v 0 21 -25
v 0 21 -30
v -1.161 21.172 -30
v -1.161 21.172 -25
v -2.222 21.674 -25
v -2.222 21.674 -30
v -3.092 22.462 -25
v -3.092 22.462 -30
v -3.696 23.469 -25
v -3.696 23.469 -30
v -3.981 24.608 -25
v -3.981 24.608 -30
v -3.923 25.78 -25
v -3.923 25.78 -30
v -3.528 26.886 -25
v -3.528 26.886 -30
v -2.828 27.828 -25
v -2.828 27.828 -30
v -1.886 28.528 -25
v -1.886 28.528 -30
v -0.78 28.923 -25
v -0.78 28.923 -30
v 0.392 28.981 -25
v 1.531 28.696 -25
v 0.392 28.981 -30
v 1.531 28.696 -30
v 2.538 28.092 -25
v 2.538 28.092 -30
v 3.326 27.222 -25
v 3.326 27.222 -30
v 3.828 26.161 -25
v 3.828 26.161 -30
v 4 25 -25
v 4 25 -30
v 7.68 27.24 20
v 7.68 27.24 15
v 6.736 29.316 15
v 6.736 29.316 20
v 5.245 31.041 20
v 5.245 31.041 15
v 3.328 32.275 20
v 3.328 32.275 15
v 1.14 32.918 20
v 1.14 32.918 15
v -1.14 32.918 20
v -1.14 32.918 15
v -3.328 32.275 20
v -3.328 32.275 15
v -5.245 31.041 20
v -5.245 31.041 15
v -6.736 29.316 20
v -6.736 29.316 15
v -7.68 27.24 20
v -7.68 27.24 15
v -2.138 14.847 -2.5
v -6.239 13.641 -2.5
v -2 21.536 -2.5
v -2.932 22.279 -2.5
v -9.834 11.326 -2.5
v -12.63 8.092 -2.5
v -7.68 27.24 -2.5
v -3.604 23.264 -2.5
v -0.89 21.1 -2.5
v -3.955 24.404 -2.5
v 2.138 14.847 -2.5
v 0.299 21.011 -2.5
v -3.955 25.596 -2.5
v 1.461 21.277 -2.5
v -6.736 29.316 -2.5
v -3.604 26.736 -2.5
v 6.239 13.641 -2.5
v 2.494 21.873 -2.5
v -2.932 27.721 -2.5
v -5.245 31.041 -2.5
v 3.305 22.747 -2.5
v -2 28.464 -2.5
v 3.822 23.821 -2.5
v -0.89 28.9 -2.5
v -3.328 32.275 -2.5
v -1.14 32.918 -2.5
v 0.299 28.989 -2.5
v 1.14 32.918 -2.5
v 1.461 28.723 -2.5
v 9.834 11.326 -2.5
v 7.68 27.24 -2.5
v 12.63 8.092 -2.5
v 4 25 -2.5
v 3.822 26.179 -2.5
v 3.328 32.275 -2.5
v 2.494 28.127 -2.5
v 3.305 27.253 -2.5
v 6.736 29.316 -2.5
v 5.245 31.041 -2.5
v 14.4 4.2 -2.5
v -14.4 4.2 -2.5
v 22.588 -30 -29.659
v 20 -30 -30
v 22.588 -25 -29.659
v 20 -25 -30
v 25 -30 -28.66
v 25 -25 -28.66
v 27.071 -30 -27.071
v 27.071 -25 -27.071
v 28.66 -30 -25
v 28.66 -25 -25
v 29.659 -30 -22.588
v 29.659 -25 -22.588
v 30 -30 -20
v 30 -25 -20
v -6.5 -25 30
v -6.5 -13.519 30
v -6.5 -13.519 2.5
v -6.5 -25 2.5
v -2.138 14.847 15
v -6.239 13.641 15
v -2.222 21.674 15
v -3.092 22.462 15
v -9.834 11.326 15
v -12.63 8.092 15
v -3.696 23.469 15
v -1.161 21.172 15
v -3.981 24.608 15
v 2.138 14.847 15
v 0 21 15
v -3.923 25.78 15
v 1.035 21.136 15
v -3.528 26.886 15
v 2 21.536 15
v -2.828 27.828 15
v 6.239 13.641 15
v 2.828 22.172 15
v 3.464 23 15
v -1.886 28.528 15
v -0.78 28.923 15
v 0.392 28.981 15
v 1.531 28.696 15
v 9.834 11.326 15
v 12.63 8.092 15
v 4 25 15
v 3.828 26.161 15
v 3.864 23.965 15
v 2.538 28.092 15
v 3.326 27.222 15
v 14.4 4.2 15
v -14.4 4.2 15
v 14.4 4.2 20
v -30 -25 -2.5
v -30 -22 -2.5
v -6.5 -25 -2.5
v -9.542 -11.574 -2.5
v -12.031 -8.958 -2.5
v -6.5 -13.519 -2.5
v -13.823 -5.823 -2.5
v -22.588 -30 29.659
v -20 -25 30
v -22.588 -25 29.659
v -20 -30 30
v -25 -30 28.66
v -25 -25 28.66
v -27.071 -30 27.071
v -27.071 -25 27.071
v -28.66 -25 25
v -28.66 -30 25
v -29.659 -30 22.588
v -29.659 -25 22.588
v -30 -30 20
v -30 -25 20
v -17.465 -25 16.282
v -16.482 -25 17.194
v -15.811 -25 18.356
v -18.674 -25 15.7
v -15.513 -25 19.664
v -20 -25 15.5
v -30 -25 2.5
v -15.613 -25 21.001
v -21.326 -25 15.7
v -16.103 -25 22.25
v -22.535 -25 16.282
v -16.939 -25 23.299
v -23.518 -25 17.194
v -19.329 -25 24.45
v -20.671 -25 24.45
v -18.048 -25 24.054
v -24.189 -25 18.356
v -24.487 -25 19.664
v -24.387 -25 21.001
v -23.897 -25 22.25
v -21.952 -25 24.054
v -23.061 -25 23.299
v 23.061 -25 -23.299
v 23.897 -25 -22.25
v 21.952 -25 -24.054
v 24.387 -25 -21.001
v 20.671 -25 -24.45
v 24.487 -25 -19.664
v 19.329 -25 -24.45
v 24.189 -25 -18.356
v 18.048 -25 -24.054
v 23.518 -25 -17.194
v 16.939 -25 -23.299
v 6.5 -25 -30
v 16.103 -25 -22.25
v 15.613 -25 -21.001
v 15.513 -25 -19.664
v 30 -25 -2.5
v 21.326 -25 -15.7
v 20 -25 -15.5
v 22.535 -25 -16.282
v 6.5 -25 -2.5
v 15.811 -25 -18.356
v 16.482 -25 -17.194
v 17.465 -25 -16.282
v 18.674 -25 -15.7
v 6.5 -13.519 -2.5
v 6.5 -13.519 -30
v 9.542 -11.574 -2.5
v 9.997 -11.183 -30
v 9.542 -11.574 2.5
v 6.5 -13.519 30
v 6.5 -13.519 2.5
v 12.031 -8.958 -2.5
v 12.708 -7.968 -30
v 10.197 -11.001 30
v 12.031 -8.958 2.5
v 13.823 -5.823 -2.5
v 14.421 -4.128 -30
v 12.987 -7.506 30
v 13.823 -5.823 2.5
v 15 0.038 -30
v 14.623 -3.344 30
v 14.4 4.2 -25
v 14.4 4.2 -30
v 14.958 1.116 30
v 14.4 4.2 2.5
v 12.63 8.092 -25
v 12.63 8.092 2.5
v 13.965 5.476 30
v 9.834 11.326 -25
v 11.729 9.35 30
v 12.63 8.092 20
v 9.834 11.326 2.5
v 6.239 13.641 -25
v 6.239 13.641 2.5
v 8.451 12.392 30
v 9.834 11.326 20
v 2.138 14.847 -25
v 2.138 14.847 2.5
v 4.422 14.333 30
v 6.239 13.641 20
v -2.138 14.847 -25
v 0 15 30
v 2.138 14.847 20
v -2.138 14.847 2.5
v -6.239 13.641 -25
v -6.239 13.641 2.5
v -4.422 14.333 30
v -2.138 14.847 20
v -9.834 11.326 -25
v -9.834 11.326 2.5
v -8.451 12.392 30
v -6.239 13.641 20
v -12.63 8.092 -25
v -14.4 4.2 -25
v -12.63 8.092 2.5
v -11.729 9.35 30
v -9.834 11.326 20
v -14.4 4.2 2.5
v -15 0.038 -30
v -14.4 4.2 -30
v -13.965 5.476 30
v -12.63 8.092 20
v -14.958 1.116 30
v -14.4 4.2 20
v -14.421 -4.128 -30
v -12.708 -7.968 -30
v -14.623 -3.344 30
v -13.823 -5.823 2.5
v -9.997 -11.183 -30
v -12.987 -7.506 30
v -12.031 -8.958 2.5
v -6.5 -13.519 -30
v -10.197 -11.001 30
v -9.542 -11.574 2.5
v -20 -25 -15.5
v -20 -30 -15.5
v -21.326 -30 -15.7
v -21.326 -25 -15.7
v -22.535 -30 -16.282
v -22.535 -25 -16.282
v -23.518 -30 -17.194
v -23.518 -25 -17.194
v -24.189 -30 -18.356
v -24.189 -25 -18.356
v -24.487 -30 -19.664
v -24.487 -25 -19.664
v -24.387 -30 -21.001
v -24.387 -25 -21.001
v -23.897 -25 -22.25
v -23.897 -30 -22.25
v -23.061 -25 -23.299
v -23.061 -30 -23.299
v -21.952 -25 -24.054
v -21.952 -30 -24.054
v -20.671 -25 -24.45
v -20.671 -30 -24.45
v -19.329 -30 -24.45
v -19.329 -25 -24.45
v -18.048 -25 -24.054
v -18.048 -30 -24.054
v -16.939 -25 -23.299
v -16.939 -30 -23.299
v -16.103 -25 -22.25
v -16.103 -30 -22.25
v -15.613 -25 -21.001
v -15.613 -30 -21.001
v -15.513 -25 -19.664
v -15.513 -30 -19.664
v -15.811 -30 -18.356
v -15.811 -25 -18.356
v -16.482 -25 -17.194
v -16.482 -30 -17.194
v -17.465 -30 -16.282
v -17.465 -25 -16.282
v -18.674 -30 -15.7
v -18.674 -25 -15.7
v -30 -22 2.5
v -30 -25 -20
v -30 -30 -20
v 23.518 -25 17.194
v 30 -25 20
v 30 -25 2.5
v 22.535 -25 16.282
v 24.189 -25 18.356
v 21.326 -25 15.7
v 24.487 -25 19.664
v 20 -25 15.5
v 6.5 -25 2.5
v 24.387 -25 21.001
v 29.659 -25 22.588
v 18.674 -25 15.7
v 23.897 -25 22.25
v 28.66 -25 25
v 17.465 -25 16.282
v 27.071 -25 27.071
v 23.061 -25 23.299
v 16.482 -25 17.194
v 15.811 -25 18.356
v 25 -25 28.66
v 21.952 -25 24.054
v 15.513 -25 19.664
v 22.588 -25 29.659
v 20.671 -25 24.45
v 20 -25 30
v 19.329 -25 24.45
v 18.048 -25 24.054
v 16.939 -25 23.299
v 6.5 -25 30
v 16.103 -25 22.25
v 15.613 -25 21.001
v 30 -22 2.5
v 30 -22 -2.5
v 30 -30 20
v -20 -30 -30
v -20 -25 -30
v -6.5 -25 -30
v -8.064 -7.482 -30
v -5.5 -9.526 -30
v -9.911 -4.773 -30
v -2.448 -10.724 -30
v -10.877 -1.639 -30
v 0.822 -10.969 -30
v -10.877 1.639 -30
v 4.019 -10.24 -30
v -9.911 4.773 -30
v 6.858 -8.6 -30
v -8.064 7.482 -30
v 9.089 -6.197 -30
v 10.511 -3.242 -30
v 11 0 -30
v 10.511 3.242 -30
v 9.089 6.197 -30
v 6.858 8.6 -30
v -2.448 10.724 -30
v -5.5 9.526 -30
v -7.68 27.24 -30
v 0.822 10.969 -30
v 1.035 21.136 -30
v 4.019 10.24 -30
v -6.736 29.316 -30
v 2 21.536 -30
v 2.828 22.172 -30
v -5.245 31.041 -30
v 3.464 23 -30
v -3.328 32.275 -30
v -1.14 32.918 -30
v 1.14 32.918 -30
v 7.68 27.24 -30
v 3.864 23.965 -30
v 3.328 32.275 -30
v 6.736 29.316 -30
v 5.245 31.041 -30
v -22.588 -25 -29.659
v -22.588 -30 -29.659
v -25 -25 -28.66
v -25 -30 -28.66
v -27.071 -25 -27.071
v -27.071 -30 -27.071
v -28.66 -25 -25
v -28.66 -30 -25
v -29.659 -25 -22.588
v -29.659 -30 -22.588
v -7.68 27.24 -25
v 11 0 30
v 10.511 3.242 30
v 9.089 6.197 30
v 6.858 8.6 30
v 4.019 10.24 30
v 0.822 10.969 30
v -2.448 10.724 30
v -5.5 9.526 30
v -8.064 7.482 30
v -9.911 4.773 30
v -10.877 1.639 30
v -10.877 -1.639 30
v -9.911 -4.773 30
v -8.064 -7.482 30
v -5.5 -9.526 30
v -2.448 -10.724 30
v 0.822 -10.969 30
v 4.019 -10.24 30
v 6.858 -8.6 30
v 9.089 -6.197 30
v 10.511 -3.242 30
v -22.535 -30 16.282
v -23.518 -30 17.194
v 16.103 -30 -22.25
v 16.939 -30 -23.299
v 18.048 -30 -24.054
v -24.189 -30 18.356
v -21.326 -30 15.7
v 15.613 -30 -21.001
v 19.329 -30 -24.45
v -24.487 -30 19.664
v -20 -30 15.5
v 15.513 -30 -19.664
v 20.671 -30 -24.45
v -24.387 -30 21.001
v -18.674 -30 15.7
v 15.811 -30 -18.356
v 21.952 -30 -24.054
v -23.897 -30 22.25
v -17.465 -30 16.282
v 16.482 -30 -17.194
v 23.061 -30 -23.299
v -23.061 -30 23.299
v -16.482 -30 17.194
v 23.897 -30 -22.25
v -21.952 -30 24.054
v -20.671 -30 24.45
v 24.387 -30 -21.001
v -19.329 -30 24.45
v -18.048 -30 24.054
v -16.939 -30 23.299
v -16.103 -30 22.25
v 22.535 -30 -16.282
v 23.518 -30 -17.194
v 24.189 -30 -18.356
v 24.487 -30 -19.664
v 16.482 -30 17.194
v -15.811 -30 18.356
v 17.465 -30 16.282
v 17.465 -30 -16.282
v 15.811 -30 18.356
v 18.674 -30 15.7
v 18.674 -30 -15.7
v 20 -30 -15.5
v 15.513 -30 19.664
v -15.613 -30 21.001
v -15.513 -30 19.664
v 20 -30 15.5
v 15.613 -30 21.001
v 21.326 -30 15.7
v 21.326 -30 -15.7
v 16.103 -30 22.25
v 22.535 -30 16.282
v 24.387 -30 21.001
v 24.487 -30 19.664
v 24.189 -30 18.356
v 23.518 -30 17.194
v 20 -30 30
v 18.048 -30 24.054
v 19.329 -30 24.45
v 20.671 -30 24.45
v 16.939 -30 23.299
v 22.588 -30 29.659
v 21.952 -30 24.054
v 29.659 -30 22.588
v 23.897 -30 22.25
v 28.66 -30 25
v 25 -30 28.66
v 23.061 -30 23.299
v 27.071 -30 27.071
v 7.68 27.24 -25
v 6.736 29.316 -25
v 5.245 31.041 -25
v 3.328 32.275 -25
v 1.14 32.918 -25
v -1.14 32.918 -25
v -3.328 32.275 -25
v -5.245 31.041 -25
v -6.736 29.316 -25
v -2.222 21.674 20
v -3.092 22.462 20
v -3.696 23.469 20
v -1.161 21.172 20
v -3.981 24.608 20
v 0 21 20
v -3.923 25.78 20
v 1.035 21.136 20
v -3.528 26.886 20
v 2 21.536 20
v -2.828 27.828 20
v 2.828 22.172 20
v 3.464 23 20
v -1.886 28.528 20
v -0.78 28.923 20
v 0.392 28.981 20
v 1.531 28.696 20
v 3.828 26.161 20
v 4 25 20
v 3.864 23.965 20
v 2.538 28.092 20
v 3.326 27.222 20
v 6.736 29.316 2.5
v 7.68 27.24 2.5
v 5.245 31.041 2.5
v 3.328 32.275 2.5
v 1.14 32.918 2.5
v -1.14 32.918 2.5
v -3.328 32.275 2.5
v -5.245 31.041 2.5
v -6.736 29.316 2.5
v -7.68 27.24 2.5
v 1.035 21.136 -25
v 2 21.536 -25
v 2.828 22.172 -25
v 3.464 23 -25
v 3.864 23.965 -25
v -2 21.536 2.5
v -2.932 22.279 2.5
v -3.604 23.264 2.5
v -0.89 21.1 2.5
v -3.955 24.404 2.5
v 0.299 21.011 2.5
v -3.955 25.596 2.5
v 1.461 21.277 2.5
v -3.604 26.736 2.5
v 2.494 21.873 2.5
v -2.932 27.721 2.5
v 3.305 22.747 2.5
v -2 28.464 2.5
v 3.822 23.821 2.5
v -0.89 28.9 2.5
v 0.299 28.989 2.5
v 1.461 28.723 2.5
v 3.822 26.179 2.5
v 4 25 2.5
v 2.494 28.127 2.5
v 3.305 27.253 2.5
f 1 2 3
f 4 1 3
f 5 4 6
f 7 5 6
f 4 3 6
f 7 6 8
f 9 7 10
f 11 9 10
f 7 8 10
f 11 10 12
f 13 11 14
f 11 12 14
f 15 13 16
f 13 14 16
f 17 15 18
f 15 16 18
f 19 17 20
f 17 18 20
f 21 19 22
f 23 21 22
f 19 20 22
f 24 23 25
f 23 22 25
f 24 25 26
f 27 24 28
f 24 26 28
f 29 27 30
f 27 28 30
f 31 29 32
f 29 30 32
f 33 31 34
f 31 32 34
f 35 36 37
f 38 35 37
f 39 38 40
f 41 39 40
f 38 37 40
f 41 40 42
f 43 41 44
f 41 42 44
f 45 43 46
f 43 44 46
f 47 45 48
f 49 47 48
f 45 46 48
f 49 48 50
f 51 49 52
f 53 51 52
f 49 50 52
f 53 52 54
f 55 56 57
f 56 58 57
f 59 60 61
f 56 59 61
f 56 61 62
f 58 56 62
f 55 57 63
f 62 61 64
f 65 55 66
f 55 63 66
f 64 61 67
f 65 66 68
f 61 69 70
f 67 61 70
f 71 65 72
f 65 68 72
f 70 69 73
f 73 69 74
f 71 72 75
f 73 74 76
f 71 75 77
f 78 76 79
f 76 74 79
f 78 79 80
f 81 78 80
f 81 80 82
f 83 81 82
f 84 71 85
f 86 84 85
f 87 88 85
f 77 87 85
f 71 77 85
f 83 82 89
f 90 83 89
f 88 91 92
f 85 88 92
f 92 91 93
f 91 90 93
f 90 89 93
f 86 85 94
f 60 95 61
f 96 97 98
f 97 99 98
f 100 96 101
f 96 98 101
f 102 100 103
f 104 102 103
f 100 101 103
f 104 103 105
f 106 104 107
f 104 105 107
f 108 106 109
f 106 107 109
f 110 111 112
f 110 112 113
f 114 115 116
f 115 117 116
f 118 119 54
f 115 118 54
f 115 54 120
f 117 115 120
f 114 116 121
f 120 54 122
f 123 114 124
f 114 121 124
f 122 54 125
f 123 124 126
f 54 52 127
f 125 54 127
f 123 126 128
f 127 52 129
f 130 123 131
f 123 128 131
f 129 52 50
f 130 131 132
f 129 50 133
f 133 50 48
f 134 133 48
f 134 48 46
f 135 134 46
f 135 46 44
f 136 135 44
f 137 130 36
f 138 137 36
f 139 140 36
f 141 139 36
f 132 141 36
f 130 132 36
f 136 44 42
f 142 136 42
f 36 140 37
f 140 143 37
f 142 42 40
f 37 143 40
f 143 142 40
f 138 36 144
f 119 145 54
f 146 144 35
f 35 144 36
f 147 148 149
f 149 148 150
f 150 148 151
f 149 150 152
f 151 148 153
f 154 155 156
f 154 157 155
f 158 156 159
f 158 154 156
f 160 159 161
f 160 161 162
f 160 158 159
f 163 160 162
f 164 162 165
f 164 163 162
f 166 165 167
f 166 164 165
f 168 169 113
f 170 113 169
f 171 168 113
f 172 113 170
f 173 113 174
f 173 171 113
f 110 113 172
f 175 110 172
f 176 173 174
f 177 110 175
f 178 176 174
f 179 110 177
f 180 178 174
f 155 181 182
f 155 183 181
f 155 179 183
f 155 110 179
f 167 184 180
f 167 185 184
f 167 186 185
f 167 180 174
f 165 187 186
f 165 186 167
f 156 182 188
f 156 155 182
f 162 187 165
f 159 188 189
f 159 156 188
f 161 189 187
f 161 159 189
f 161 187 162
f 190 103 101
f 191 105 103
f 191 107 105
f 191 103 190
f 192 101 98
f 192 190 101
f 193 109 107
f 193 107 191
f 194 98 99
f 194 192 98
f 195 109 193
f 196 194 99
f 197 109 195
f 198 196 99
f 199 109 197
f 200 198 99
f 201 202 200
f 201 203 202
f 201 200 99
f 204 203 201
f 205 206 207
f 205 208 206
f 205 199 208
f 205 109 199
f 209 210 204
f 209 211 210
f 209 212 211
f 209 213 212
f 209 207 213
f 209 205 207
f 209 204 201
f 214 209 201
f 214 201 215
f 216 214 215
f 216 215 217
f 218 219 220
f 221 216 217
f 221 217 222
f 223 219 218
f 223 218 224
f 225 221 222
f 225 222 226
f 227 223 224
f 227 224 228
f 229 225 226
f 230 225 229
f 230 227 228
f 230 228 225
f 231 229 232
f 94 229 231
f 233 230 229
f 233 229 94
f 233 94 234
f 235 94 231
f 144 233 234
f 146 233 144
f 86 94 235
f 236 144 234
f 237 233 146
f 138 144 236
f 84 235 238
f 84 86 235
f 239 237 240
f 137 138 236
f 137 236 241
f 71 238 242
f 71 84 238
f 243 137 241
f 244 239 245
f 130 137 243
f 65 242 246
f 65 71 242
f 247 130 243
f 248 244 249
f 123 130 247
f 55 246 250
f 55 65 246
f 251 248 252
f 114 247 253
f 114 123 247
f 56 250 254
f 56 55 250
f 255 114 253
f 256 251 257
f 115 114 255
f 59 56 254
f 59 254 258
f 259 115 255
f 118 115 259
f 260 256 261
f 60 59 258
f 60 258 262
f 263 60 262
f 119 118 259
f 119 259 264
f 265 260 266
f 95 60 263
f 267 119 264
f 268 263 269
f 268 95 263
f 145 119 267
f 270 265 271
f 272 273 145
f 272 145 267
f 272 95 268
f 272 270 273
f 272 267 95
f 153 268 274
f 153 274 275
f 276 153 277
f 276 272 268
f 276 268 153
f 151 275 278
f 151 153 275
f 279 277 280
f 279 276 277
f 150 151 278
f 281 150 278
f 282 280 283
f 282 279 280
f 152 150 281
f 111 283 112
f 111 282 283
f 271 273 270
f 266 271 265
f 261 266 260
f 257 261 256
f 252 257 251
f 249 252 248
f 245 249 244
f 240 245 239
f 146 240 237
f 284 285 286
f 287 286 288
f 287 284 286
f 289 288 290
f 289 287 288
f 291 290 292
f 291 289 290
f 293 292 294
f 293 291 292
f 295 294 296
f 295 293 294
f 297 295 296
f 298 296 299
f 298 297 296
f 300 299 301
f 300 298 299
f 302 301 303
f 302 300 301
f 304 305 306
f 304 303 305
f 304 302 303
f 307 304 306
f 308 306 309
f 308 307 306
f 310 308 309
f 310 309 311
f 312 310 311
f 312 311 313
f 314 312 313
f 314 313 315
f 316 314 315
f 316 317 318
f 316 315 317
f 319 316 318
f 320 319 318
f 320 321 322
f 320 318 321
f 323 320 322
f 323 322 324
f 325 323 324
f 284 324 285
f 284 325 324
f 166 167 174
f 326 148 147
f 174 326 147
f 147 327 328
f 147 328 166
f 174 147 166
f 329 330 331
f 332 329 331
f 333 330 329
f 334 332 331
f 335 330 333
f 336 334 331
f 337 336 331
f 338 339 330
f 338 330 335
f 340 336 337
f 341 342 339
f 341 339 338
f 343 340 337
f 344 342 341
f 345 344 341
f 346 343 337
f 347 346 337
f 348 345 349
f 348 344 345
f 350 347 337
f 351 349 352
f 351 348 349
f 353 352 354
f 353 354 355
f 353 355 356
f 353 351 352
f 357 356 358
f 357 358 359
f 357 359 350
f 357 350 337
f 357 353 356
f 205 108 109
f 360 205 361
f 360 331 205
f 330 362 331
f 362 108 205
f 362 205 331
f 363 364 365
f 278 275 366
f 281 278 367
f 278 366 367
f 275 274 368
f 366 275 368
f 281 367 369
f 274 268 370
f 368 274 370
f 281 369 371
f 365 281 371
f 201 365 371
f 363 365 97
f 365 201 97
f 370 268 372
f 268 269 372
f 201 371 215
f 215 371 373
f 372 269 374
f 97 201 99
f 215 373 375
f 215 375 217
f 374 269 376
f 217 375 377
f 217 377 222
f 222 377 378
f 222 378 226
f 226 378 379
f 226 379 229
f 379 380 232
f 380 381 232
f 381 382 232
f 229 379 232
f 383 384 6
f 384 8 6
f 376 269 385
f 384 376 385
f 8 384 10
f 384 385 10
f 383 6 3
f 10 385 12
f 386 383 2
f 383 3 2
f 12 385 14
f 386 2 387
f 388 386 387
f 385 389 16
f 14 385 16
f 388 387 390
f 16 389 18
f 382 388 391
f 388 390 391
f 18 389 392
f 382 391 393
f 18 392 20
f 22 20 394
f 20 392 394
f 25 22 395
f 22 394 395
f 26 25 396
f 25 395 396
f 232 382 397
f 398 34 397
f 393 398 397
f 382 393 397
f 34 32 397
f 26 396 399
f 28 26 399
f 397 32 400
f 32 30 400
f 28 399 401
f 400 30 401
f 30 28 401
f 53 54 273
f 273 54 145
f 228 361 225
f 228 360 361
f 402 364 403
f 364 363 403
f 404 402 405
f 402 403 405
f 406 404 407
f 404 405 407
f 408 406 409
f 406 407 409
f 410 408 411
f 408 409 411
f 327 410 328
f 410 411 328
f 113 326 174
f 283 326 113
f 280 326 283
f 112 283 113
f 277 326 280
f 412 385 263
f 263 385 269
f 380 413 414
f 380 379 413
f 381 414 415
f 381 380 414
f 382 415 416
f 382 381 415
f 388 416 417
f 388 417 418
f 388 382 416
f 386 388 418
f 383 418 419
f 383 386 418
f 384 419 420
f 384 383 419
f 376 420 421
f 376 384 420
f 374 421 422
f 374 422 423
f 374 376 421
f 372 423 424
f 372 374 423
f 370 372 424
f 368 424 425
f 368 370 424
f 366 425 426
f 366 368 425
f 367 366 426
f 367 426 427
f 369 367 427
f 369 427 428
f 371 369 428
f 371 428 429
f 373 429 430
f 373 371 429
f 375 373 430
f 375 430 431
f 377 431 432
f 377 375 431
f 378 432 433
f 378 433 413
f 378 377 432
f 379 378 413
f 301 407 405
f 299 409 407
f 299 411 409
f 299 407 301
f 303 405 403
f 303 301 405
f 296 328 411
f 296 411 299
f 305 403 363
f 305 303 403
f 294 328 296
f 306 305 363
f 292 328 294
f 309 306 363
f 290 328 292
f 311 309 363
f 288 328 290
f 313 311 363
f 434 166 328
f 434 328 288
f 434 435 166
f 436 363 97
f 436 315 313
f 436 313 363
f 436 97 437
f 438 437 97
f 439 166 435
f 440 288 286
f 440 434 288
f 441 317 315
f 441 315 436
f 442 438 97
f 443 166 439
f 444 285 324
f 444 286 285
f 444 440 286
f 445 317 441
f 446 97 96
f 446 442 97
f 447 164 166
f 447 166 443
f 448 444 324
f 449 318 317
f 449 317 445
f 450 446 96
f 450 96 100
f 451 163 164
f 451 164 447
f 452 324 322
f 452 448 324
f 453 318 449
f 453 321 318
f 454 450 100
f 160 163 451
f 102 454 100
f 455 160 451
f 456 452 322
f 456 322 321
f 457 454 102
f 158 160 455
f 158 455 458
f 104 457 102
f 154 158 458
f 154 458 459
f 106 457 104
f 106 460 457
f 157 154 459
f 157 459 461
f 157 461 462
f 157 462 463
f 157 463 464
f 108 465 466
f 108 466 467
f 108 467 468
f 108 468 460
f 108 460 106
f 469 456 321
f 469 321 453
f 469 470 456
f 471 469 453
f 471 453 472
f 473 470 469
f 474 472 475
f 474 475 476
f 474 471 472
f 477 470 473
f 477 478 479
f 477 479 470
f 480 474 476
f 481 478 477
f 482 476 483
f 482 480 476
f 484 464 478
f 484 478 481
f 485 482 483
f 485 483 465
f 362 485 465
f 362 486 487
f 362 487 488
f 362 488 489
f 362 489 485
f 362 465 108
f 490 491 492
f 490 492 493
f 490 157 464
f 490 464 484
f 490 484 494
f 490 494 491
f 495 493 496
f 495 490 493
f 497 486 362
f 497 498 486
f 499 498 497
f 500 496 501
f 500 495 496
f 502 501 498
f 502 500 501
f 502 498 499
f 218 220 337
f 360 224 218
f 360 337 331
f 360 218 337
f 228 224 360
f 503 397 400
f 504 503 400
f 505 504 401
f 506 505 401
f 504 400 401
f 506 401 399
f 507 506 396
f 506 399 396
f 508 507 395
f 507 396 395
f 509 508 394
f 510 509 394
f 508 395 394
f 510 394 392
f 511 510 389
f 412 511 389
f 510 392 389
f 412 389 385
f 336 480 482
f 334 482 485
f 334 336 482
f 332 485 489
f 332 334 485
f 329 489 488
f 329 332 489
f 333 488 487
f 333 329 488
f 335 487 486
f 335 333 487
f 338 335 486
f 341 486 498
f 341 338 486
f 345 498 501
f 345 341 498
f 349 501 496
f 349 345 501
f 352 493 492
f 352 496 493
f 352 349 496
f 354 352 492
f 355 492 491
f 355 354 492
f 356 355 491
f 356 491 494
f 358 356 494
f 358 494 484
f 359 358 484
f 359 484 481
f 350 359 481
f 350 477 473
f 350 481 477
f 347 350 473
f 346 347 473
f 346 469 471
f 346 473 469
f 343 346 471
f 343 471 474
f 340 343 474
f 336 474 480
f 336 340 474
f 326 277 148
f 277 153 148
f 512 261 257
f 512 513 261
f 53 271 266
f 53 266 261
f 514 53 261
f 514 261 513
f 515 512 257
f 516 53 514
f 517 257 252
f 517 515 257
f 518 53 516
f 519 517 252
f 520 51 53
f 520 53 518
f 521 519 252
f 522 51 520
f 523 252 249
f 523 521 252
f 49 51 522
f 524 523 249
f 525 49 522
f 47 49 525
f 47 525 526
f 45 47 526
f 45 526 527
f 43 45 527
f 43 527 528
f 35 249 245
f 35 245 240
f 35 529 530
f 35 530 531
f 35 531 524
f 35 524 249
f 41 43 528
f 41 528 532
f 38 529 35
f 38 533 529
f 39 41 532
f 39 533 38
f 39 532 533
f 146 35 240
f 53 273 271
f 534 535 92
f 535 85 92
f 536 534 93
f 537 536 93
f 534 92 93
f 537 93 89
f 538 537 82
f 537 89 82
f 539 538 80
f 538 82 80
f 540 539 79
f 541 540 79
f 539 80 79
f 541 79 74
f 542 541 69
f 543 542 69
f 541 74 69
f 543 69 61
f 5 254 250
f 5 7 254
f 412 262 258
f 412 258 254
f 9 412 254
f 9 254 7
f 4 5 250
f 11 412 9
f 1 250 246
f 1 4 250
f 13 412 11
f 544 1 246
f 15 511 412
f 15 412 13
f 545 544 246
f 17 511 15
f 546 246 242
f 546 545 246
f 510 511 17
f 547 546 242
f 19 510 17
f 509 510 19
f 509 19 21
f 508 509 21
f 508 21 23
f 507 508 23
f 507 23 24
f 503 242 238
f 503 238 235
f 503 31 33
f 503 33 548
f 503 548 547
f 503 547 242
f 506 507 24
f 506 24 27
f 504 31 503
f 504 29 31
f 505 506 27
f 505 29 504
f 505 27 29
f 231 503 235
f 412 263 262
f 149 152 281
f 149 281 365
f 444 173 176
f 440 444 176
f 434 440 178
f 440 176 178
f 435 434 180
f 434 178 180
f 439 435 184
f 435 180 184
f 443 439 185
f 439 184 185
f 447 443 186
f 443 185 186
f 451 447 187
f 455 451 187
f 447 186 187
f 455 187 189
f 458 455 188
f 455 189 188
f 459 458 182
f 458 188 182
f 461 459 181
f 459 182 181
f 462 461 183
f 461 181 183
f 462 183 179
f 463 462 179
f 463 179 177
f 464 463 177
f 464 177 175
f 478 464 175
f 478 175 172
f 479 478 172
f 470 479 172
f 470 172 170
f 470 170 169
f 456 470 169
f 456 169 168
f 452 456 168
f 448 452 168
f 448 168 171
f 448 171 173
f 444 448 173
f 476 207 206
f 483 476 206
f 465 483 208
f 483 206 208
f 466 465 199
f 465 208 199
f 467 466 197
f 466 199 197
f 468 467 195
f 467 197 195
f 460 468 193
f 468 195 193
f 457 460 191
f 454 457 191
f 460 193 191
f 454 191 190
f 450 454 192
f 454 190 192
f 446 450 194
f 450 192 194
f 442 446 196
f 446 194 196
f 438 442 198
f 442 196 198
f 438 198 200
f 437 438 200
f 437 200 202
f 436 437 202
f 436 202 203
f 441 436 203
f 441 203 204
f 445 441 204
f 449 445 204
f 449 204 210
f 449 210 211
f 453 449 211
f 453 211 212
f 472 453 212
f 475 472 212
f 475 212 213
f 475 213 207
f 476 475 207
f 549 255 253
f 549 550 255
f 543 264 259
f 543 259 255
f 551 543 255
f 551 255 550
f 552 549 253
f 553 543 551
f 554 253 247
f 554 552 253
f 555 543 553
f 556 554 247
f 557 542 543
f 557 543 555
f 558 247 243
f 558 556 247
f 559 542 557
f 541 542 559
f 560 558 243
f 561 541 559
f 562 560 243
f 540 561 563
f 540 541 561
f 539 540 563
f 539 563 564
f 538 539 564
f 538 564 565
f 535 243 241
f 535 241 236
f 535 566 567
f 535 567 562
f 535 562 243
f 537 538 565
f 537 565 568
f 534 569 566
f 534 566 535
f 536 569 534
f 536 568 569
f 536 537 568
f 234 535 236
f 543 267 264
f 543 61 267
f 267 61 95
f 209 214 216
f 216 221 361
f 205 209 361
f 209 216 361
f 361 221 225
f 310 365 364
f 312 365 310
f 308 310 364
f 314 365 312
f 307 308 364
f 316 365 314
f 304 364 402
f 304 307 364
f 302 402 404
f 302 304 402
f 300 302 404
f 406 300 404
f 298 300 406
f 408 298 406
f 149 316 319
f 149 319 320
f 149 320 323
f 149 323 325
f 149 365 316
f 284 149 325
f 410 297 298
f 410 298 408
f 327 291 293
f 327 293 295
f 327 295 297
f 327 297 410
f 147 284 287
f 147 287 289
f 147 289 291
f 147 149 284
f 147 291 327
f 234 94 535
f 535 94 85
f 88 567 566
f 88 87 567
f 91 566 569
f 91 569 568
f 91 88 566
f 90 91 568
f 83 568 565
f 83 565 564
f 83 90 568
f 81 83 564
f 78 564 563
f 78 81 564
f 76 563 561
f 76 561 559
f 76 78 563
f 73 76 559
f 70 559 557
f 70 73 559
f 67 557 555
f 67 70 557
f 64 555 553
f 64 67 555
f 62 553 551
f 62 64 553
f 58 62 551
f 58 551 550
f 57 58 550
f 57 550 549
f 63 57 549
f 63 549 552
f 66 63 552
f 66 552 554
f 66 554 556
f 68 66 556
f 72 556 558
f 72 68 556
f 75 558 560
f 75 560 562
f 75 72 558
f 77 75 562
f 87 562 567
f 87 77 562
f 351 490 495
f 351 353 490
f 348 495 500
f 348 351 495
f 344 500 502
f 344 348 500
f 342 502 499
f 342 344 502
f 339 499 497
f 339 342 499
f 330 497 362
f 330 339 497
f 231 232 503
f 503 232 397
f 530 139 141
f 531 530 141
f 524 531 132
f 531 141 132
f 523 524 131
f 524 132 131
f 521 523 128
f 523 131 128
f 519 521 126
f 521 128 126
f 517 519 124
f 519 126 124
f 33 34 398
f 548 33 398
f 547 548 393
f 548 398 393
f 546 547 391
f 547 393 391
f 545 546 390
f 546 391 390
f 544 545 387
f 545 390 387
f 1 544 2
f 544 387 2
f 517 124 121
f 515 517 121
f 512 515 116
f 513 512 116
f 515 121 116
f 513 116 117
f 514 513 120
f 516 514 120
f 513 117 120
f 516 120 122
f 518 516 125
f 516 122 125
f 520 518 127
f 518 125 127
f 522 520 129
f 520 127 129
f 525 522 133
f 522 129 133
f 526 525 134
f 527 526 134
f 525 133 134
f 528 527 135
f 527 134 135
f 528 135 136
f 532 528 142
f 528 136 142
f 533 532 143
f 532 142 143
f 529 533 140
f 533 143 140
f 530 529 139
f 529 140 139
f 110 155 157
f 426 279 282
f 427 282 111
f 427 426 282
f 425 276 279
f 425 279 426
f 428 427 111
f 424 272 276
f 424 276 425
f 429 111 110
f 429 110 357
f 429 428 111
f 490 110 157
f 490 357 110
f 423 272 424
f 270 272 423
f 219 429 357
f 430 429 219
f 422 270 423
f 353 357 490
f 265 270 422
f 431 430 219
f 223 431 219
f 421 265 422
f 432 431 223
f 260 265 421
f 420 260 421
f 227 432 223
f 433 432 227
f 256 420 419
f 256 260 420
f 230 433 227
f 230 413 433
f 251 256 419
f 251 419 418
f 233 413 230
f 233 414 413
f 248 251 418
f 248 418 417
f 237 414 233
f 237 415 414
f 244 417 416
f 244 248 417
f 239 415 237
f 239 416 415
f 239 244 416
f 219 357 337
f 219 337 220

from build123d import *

# Parameters (mm, degrees)
SKETCH_2_R               = 11
EXTRUDE_2_DEPTH          = 30
SKETCH_2_6_R             = 4
EXTRUDE_3_DEPTH          = 2.5
EXTRUDE_START            = 15
EXTRUDE_4_DEPTH          = 5
EXTRUDE_START_2          = -30
EXTRUDE_5_DEPTH          = 5
SKETCH_4_R               = 4.5
CUT_EXTRUDE_1_DEPTH      = 72.860976893
MIRROR_2_COPY_1_SKETCH_R = 4.5
MIRROR_2_COPY_1_DEPTH    = 72.860976893
FILLET_1_R               = 10


with BuildPart() as part:
    # Эскиз2 → Бобышка-Вытянуть2 (new, symmetric)
    with BuildSketch(Plane.XY):
        with BuildLine():
            Line((-6.5, -13.518505835), (-6.5, -25))
            Line((-6.5, -25), (-30, -25))
            Line((-30, -25), (-30, -30))
            Line((-30, -30), (30, -30))
            Line((30, -30), (30, -25))
            Line((30, -25), (6.5, -25))
            Line((6.5, -25), (6.5, -13.518505835))
            ThreePointArc((6.5, -13.518505835), (0, 15), (-6.5, -13.518505835))
        make_face()
        Circle(SKETCH_2_R, mode=Mode.SUBTRACT)
    extrude(amount=EXTRUDE_2_DEPTH, both=True)

    # Эскиз2<6> → Бобышка-Вытянуть3 (add, symmetric)
    with BuildSketch(Plane.XY):
        with BuildLine():
            ThreePointArc((-14.4, 4.2), (-9, 12), (0, 15))
            ThreePointArc((0, 15), (9, 12), (14.4, 4.2))
            Line((14.4, 4.2), (7.68, 27.24))
            ThreePointArc((7.68, 27.24), (0, 33), (-7.68, 27.24))
            Line((-7.68, 27.24), (-14.4, 4.2))
        make_face()
        with Locations((0, 25)):
            Circle(SKETCH_2_6_R, mode=Mode.SUBTRACT)
        with BuildLine():
            ThreePointArc((-6.5, -13.518505835), (-10.865729218, -10.340982959), (-13.823441352, -5.823441352))
            Line((-13.823441352, -5.823441352), (-30, -22))
            Line((-30, -22), (-30, -25))
            Line((-30, -25), (-6.5, -25))
            Line((-6.5, -25), (-6.5, -13.518505835))
        make_face()
        with BuildLine():
            Line((30, -22), (13.823441352, -5.823441352))
            ThreePointArc((13.823441352, -5.823441352), (10.865729218, -10.340982959), (6.5, -13.518505835))
            Line((6.5, -13.518505835), (6.5, -25))
            Line((6.5, -25), (30, -25))
            Line((30, -25), (30, -22))
        make_face()
    extrude(amount=EXTRUDE_3_DEPTH, both=True)

    # Эскиз2<8> → Бобышка-Вытянуть4 (add)
    with BuildSketch(Plane.XY.offset(EXTRUDE_START)):
        with BuildLine():
            ThreePointArc((-14.4, 4.2), (-9, 12), (0, 15))
            ThreePointArc((0, 15), (9, 12), (14.4, 4.2))
            Line((14.4, 4.2), (7.68, 27.24))
            ThreePointArc((7.68, 27.24), (0, 33), (-7.68, 27.24))
            Line((-7.68, 27.24), (-14.4, 4.2))
        make_face()
        with BuildLine():
            ThreePointArc((4, 25), (2.828427125, 22.171572875), (0, 21))
            ThreePointArc((0, 21), (-2.828427125, 27.828427125), (4, 25))
        make_face(mode=Mode.SUBTRACT)
    extrude(amount=EXTRUDE_4_DEPTH)

    # Эскиз2<9> → Бобышка-Вытянуть5 (add)
    with BuildSketch(Plane.XY.offset(EXTRUDE_START_2)):
        with BuildLine():
            ThreePointArc((-14.4, 4.2), (-9, 12), (0, 15))
            ThreePointArc((0, 15), (9, 12), (14.4, 4.2))
            Line((14.4, 4.2), (7.68, 27.24))
            ThreePointArc((7.68, 27.24), (0, 33), (-7.68, 27.24))
            Line((-7.68, 27.24), (-14.4, 4.2))
        make_face()
        with BuildLine():
            ThreePointArc((4, 25), (2.828427125, 22.171572875), (0, 21))
            ThreePointArc((0, 21), (-2.828427125, 27.828427125), (4, 25))
        make_face(mode=Mode.SUBTRACT)
    extrude(amount=EXTRUDE_5_DEPTH)

    # Эскиз4 → Вырез-Вытянуть1 (cut, through all)
    with BuildSketch(Plane(origin=(0, -25, 0), x_dir=(1, 0, 0), z_dir=(0, 1, 0))):
        with Locations(Location((20, 20, 0), (0, 0, 270))):
            Circle(SKETCH_4_R)
    cut_extrude_1 = extrude(amount=-CUT_EXTRUDE_1_DEPTH, mode=Mode.SUBTRACT)

    # Зеркальное отражение1: Вырез-Вытянуть1 across plane
    add(cut_extrude_1.mirror(Plane.XY), mode=Mode.SUBTRACT)

    # Зеркальное отражение2: Вырез-Вытянуть1 across plane
    add(cut_extrude_1.mirror(Plane(origin=(0, 0, 0), x_dir=(0, 0, 1), z_dir=(1, 0, 0))), mode=Mode.SUBTRACT)

    # Зеркальное отражение2 copy 1 sketch → Зеркальное отражение2 copy 1 (cut, through all)
    with BuildSketch(Plane(origin=(0, -25, 0), x_dir=(-1, 0, 0), z_dir=(0, 1, 0))):
        with Locations(Location((20, 20, 0), (0, 0, 270))):
            Circle(MIRROR_2_COPY_1_SKETCH_R)
    extrude(amount=-MIRROR_2_COPY_1_DEPTH, mode=Mode.SUBTRACT)

    # Скругление1
    fillet_1_edges = [part.edges().sort_by_distance(p)[0] for p in [
        (30, -27.5, -30),
        (-30, -27.5, -30),
        (-30, -27.5, 30),
        (30, -27.5, 30),
    ]]
    fillet(fillet_1_edges, radius=FILLET_1_R)


solid = part.part
